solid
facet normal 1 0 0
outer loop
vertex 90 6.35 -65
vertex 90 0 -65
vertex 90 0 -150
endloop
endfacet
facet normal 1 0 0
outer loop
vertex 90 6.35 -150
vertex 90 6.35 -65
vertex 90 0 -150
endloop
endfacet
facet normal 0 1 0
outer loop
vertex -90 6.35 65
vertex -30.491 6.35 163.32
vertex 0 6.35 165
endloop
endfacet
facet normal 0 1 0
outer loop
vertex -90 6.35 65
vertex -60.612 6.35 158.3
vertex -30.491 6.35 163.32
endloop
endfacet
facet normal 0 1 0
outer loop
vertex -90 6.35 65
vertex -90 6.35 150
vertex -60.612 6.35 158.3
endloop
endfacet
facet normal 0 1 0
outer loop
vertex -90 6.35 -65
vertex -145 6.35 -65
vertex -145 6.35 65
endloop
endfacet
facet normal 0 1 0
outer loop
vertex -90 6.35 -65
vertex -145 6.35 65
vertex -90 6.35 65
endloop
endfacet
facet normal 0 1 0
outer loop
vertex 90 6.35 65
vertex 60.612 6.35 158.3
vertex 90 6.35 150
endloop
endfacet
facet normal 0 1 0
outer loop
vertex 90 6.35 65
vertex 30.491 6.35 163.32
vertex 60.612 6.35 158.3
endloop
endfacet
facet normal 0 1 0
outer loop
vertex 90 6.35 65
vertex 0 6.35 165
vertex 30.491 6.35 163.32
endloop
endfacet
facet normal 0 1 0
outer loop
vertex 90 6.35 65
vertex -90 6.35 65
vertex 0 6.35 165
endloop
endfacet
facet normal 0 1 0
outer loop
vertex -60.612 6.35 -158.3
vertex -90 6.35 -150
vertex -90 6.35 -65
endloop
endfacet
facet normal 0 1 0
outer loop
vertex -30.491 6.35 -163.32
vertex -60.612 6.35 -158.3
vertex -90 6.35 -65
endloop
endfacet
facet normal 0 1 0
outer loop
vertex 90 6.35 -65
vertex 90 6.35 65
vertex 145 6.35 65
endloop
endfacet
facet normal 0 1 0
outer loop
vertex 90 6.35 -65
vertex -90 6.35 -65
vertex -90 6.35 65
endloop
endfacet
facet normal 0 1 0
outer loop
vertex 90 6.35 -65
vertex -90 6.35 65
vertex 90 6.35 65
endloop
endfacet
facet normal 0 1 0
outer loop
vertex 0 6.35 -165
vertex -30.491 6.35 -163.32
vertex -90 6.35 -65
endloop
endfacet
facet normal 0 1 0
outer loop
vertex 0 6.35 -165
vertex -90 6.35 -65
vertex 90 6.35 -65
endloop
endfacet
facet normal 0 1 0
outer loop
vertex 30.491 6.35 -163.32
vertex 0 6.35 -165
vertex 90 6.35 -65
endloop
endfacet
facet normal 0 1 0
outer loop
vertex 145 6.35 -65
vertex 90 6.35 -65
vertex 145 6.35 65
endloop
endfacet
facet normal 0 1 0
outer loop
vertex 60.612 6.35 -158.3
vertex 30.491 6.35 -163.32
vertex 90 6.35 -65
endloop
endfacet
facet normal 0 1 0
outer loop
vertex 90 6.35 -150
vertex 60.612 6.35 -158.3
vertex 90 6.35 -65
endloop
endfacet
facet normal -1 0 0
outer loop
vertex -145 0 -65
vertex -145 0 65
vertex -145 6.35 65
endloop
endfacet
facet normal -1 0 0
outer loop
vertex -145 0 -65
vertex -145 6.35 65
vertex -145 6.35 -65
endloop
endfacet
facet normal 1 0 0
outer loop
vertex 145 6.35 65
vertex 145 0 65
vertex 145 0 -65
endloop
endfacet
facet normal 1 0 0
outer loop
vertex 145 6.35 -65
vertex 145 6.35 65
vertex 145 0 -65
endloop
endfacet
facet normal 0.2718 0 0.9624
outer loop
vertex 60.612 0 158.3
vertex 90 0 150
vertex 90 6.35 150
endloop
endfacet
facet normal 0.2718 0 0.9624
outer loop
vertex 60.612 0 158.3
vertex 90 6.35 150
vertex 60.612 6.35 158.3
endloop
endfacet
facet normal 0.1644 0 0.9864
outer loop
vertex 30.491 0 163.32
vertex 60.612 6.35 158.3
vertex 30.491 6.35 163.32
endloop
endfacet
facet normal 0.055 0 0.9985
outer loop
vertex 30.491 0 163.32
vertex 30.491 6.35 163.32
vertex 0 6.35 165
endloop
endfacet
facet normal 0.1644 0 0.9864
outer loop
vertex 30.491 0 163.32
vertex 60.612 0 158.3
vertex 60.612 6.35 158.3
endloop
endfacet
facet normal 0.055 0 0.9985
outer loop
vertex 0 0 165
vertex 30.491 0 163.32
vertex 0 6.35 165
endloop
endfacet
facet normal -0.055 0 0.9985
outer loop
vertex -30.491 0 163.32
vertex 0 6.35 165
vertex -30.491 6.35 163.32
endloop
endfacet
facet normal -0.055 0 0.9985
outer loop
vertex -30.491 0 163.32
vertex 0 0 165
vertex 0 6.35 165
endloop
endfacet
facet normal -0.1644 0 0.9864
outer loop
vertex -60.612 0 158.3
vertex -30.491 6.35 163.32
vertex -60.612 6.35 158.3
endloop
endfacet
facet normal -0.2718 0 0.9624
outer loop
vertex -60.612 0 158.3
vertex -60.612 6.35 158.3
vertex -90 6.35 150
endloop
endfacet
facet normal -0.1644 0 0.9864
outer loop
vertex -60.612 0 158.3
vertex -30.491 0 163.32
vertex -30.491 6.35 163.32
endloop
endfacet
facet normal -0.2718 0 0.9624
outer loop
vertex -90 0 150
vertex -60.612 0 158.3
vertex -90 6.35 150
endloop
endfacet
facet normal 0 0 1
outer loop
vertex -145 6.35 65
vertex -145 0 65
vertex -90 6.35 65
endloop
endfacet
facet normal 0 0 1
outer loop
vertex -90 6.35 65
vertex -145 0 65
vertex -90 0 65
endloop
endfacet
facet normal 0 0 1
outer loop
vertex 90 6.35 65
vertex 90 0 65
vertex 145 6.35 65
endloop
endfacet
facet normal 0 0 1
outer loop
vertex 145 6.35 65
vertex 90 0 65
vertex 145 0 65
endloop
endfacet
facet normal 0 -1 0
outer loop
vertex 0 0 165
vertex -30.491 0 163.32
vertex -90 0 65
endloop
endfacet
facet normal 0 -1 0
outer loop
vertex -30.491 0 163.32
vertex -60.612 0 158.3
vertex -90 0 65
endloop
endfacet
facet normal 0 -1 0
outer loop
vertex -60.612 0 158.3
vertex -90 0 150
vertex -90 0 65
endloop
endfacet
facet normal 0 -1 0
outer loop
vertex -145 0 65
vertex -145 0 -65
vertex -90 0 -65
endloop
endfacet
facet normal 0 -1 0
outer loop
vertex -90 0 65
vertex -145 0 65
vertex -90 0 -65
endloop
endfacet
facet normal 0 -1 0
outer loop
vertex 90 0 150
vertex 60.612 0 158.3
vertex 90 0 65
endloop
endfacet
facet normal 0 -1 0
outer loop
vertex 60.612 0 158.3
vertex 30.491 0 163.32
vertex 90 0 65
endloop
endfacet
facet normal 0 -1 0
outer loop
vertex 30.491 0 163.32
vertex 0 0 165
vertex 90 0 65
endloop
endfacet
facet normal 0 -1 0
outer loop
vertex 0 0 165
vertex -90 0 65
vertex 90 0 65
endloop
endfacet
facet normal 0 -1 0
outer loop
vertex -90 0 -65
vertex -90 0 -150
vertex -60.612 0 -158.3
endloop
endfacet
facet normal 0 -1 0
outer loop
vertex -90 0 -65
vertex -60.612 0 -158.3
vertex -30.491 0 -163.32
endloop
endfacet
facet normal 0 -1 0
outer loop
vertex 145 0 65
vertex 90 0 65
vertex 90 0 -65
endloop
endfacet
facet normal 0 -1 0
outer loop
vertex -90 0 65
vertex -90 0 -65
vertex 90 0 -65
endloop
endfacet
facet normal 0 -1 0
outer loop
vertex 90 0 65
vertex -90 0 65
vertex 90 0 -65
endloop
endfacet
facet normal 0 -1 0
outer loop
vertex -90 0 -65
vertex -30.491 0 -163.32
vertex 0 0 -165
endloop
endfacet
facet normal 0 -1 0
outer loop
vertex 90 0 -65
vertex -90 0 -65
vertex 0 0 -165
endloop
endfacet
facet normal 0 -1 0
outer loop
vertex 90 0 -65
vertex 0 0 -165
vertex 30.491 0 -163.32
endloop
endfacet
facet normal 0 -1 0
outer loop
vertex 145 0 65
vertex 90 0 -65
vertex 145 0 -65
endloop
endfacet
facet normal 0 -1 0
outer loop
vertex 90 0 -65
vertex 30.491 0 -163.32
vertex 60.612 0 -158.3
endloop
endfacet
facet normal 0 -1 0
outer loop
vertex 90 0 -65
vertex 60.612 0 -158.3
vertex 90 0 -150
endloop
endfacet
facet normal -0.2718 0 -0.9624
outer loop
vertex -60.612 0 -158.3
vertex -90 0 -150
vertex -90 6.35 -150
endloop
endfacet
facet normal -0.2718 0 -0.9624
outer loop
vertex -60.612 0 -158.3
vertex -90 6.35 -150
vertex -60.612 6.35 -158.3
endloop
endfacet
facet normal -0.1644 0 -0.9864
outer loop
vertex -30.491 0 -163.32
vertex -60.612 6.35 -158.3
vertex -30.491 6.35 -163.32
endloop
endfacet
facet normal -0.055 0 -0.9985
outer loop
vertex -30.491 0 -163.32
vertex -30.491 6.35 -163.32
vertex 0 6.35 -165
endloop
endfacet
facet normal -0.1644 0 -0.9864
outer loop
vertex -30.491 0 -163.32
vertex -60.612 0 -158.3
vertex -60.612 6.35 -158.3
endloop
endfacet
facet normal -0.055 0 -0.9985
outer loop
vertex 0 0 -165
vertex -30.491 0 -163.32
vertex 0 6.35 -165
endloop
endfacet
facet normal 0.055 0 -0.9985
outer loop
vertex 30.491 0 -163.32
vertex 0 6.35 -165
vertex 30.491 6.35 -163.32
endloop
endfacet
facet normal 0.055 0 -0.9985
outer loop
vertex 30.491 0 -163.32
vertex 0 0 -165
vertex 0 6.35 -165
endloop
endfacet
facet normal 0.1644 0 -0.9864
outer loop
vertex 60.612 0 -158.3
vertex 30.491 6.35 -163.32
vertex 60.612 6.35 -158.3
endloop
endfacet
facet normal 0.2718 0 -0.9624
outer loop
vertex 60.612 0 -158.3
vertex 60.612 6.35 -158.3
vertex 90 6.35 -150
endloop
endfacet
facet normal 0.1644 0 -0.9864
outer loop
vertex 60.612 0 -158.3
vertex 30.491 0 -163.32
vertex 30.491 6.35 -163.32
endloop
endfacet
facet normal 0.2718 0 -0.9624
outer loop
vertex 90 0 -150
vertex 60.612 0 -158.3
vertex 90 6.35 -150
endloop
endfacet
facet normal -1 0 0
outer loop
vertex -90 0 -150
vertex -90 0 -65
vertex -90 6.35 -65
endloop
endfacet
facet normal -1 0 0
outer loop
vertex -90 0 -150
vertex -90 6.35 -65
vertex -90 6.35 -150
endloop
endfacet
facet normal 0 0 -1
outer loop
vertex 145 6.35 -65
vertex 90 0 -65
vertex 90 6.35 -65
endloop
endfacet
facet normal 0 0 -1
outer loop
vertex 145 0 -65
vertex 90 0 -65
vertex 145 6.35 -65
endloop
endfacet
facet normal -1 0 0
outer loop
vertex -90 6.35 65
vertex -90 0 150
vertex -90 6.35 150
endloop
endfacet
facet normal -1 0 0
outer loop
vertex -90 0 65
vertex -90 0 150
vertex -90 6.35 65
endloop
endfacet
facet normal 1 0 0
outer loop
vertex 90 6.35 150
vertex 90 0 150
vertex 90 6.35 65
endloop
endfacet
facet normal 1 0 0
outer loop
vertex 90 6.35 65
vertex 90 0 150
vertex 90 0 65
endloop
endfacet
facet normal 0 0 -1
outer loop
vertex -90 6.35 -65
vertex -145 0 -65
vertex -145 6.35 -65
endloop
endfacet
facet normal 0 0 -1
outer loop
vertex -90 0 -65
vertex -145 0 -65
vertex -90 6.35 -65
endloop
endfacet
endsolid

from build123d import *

# Parameters (mm, degrees)
ESQUISSE1_W        = 180
ESQUISSE1_H        = 300
ESQUISSE1_W_2      = 55
ESQUISSE1_H_2      = 130
BOSS_EXTRU_1_DEPTH = 6.35


with BuildPart() as part:
    # Esquisse1 → Boss.-Extru.1 (new body)
    with BuildSketch(Plane(origin=(0, 0, 0), x_dir=(1, 0, 0), z_dir=(0, 1, 0))):
        Rectangle(ESQUISSE1_W, ESQUISSE1_H)
        with Locations((-117.5, 0)):
            Rectangle(ESQUISSE1_W_2, ESQUISSE1_H_2)
        with Locations((117.5, 0)):
            Rectangle(ESQUISSE1_W_2, ESQUISSE1_H_2)
        with BuildLine():
            Line((-90, -150), (90, -150))
            ThreePointArc((90, -150), (0, -165), (-90, -150))
        make_face()
        with BuildLine():
            ThreePointArc((-90, 150), (0, 165), (90, 150))
            Line((90, 150), (-90, 150))
        make_face()
    extrude(amount=BOSS_EXTRU_1_DEPTH)


solid = part.part
